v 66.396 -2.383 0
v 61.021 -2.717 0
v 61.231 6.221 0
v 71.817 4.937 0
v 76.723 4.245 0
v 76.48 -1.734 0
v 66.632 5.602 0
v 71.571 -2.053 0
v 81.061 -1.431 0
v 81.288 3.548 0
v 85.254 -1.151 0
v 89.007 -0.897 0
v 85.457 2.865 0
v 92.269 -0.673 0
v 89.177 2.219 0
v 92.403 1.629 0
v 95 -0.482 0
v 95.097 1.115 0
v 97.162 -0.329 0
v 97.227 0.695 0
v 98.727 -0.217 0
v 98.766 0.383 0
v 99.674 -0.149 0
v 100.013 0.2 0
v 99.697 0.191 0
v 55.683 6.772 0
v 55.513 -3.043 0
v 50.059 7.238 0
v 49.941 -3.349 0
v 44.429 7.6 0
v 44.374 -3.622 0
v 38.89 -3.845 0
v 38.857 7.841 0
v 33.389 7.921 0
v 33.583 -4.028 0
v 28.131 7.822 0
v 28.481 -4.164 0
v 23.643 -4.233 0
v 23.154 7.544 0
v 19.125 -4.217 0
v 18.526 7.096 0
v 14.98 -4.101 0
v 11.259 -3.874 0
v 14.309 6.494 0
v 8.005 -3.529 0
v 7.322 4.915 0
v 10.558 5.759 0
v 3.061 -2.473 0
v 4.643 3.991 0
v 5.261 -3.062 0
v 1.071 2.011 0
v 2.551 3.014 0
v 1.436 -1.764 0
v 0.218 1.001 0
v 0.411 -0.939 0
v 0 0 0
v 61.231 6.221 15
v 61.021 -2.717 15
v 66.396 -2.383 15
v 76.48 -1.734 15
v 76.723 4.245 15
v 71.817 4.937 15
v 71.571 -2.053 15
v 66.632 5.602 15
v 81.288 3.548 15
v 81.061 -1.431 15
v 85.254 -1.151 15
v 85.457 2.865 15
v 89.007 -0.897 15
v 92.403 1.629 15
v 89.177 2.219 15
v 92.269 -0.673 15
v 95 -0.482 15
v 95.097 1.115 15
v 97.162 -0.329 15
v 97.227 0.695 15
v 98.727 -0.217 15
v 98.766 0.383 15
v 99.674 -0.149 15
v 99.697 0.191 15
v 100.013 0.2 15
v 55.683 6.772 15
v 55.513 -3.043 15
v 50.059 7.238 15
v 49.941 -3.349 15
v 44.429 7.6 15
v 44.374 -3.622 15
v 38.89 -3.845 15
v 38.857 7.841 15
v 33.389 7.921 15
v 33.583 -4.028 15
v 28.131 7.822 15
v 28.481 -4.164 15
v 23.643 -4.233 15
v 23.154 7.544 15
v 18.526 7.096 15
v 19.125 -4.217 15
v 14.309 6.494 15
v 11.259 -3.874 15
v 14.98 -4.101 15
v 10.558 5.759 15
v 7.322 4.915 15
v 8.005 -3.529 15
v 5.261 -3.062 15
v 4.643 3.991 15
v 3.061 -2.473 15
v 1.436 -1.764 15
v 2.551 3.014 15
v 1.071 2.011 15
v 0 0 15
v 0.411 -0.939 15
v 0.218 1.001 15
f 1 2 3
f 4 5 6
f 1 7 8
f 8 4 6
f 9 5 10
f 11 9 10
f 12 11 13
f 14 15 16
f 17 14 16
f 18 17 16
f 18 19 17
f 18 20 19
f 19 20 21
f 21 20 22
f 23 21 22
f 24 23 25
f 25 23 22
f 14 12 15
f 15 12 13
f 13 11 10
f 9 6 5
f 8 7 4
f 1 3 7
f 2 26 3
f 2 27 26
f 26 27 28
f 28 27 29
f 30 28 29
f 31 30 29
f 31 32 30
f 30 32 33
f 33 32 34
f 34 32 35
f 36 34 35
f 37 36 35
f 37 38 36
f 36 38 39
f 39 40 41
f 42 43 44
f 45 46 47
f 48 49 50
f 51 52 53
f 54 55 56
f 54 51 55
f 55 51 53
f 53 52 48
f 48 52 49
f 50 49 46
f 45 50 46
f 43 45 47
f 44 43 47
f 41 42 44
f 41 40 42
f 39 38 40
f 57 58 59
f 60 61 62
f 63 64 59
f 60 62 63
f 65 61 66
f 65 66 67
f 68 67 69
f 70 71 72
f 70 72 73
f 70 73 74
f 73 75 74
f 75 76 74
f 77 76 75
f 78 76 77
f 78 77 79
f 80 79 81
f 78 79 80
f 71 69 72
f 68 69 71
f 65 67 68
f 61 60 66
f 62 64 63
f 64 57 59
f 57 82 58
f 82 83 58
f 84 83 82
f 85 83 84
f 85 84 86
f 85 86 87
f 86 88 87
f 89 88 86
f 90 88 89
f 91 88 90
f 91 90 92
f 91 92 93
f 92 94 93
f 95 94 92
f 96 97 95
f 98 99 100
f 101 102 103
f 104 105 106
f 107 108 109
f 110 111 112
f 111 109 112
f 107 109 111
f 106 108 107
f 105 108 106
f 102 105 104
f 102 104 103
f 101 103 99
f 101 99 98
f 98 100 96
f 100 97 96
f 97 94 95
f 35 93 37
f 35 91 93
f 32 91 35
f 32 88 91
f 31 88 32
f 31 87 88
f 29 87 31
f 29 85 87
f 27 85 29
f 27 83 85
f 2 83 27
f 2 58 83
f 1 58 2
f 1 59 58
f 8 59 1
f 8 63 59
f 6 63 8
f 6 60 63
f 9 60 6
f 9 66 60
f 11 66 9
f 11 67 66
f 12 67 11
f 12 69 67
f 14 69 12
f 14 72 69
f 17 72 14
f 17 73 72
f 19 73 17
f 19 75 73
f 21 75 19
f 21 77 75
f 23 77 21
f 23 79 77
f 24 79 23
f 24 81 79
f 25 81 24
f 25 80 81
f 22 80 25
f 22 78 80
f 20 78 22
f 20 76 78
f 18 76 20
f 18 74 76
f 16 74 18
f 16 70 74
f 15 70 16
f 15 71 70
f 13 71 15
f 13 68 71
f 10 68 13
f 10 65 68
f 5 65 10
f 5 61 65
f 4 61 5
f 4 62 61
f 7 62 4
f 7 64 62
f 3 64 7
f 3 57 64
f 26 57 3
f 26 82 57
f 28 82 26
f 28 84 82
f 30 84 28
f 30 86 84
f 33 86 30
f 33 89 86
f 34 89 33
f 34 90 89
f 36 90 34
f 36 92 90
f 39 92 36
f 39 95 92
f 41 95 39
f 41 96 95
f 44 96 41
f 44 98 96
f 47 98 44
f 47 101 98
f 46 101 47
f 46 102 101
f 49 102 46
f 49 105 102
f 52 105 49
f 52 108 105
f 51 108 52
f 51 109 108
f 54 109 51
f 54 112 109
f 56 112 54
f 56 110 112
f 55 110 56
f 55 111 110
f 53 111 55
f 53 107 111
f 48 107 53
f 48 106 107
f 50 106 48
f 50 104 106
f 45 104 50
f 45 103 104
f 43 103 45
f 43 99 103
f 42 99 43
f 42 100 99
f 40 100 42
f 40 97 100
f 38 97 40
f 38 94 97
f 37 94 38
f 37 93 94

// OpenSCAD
// NACA 4-digit sections (Abbott & von Doenhoff). Cosine-sampled once.

function naca_xb(i, n) = 0.5 * (1 - cos(180 * i / n));

function naca_yt(xb, t) =
  let (x = max(xb, 0))
    5 * t * (
      0.2969 * sqrt(x)
      - 0.1260 * x
      - 0.3516 * x * x
      + 0.2843 * x * x * x
      - 0.1015 * x * x * x * x
    );

function naca_yc(xb, m, p) =
  (m == 0) ? 0
  : (xb < p)
    ? (m / (p * p)) * (2 * p * xb - xb * xb)
    : (m / ((1 - p) * (1 - p))) * ((1 - 2 * p) + 2 * p * xb - xb * xb);

function naca_dyc(xb, m, p) =
  (m == 0) ? 0
  : (xb < p)
    ? (2 * m / (p * p)) * (p - xb)
    : (2 * m / ((1 - p) * (1 - p))) * (p - xb);

function naca_point(xb, m, p, t, chord, side) =
  let (
    yt = naca_yt(xb, t) * chord,
    yc = naca_yc(xb, m, p) * chord,
    th = atan(naca_dyc(xb, m, p)),
    yt_use = (xb >= 0.999) ? 0.2 : yt
  )
    side > 0
      ? [xb * chord - yt_use * sin(th), yc + yt_use * cos(th)]
      : [xb * chord + yt_use * sin(th), yc - yt_use * cos(th)];

function naca_profile(m, p, t, chord, n = 24) =
  concat(
    [for (i = [0:n]) naca_point(naca_xb(i, n), m, p, t, chord, 1)],
    [for (i = [n - 1:-1:1]) naca_point(naca_xb(i, n), m, p, t, chord, -1)]
  );

function concat_all(list, i = 0) =
  i >= len(list) ? [] : concat(list[i], concat_all(list, i + 1));

function fuselage_ring(i, ns, nc, chord, width, m, p, t, nose_x) =
  let (
    xb = 0.5 * (1 - cos(180 * i / (ns + 1))),
    yt = naca_yt(xb, t) * chord,
    yc = naca_yc(xb, m, p) * chord,
    yt_ref = naca_yt(0.3, 1),
    yw = (width / 2) * max(naca_yt(xb, 1) / yt_ref, 0.04),
    xw = nose_x - xb * chord
  )
    [
      for (j = [0:nc - 1])
        let (a = 360 * j / nc)
          [xw, yw * cos(a), yc + yt * sin(a)]
    ];

function fuselage_points(ns, nc, chord, width, m, p, t, nose_x) =
  concat(
    [[nose_x, 0, 0]],
    concat_all([
      for (i = [1:ns])
        fuselage_ring(i, ns, nc, chord, width, m, p, t, nose_x)
    ]),
    [[nose_x - chord, 0, 0]]
  );

function ring_quads(a, b, nc) =
  [
    for (j = [0:nc - 1])
      [a + j, a + (j + 1) % nc, b + (j + 1) % nc, b + j]
  ];

function fuselage_faces(ns, nc) =
  let (te = 1 + ns * nc)
    concat(
      [for (j = [0:nc - 1]) [0, 1 + (j + 1) % nc, 1 + j]],
      concat_all([
        for (i = [0:ns - 2])
          ring_quads(1 + i * nc, 1 + (i + 1) * nc, nc)
      ]),
      [
        for (j = [0:nc - 1])
          [te, 1 + (ns - 1) * nc + j, 1 + (ns - 1) * nc + (j + 1) % nc]
      ]
    );

module naca_airfoil(m, p, t, chord, n = 24) {
  polygon(naca_profile(m, p, t, chord, n), convexity = 6);
}

module naca_body_revolution(t, chord, n = 24) {
  rotate_extrude(convexity = 8)
    polygon(
      concat(
        [[0.02, 0]],
        [
          for (i = [0:n])
            let (pt = naca_point(naca_xb(i, n), 0, 0.4, t, chord, 1))
              [max(pt[1], 0.05), pt[0]]
        ],
        [[0.02, chord]]
      ),
      convexity = 6
    );
}

module naca_fuselage_body(m, p, t, chord, width, nose_x, ns = 16, nc = 12) {
  polyhedron(
    points = fuselage_points(ns, nc, chord, width, m, p, t, nose_x),
    faces = fuselage_faces(ns, nc),
    convexity = 12
  );
}

$fa = 2;
$fs = 0.4;

linear_extrude(height = 15, convexity = 6)
  naca_airfoil(0.02, 0.4, 0.12, 100, 28);
